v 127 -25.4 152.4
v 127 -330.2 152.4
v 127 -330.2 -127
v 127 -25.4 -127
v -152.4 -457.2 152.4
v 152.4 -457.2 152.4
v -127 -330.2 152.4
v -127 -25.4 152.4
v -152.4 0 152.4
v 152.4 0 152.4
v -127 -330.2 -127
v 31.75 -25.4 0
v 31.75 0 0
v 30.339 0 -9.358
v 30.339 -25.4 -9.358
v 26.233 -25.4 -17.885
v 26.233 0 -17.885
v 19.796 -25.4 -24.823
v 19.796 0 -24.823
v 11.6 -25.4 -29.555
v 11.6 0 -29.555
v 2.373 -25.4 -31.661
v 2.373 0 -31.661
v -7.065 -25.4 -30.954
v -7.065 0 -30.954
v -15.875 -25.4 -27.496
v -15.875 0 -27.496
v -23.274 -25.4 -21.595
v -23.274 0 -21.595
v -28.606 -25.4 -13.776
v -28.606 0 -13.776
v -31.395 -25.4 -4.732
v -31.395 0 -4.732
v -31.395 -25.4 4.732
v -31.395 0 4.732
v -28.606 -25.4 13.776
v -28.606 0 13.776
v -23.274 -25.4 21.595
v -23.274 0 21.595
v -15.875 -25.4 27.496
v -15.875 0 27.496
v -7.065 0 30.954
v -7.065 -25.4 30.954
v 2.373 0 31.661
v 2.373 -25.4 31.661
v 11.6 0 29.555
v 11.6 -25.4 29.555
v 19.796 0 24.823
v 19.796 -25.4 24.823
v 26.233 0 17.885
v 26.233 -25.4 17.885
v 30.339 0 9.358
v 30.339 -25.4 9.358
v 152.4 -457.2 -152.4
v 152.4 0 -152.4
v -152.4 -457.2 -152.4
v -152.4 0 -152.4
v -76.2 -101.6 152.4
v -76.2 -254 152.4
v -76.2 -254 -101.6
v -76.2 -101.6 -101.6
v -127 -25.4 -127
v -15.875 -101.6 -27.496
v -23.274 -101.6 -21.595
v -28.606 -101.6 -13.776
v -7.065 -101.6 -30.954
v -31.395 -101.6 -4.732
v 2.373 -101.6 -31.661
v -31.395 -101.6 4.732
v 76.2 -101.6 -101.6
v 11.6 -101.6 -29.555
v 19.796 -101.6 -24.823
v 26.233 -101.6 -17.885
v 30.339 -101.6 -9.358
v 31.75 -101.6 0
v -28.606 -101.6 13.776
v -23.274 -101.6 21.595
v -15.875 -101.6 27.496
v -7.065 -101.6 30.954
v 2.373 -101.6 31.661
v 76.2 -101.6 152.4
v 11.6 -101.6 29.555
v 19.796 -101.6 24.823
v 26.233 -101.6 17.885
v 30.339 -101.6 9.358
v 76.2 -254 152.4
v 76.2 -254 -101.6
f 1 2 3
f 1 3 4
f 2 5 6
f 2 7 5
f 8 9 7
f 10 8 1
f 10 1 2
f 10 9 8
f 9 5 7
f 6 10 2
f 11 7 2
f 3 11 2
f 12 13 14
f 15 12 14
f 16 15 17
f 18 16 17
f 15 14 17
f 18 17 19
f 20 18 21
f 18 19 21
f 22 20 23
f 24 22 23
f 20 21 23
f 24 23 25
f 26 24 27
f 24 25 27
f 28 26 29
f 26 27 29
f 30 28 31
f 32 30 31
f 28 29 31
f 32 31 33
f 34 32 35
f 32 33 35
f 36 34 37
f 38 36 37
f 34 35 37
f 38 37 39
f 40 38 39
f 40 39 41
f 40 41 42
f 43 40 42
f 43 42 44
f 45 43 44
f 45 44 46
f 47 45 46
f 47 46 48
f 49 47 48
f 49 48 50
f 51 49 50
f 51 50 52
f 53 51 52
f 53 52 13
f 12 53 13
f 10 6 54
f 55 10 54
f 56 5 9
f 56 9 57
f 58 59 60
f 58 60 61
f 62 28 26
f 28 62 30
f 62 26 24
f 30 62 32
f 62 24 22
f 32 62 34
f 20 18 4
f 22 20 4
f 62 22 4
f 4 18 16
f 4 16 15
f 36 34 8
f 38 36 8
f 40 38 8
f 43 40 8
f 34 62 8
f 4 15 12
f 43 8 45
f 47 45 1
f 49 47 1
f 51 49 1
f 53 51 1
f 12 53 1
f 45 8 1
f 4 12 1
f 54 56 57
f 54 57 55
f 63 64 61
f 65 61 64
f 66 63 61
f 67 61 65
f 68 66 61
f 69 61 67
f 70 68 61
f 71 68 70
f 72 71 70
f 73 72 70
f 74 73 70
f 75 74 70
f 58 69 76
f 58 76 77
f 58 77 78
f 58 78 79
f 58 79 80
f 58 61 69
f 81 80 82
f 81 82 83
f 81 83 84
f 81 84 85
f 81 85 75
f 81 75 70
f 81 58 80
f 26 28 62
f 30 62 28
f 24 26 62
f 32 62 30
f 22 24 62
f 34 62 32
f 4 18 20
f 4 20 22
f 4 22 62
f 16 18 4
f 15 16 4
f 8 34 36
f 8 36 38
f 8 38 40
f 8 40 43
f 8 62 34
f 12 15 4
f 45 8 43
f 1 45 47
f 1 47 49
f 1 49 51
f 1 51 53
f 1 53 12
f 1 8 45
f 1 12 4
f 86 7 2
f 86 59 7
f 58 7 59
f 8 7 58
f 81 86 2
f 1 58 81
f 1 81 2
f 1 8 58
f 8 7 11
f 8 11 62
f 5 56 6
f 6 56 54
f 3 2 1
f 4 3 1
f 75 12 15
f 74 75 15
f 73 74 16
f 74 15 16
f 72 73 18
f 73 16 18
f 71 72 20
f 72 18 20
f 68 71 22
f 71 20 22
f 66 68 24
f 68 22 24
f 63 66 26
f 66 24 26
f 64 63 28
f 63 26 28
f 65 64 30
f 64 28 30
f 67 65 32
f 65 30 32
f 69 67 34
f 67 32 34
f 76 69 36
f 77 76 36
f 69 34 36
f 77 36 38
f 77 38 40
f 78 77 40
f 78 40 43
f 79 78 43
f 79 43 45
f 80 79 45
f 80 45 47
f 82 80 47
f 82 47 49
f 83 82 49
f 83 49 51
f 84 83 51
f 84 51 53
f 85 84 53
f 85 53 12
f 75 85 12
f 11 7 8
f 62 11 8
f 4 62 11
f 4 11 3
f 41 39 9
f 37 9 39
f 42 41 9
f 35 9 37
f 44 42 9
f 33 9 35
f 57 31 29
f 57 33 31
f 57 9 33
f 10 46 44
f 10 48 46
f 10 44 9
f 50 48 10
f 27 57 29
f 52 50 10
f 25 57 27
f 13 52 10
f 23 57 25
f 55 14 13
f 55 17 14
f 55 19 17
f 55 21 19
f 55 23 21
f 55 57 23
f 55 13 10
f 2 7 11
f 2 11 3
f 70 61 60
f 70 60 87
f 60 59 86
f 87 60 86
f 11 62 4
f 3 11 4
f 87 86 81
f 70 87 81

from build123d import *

# Parameters (mm, degrees)
SKETCH1_W      = 304.8
SKETCH1_H      = 304.8
EXTRUDE1_DEPTH = 457.2
SKETCH2_W      = 254
SKETCH2_H      = 304.8
EXTRUDE2_DEPTH = 279.4
EXTRUDE3_REACH = 306.8
SKETCH3_W      = 254
SKETCH3_H      = 304.8
SKETCH4_W      = 152.4
SKETCH4_H      = 152.4
EXTRUDE4_DEPTH = 254
SKETCH5_R      = 31.75
EXTRUDE5_DEPTH = 254


with BuildPart() as part:
    # Sketch1 → Extrude1 (new body)
    with BuildSketch(Plane(origin=(0, 0, 0), x_dir=(1, 0, 0), z_dir=(0, 1, 0))):
        Rectangle(SKETCH1_W, SKETCH1_H)
    extrude(amount=-EXTRUDE1_DEPTH)

    # Sketch2 → Extrude2 (cut)
    with BuildSketch(Plane.XY.offset(152.4)):
        with Locations((0, -177.8)):
            Rectangle(SKETCH2_W, SKETCH2_H)
    extrude(amount=-EXTRUDE2_DEPTH, mode=Mode.SUBTRACT)


with BuildPart() as body_2:

    # Sketch3 → Extrude3 (new body, up to next)
    with BuildSketch(Plane.XY.offset(152.4), mode=Mode.PRIVATE) as extrude3_sk1:
        with Locations((0, -177.8)):
            Rectangle(SKETCH3_W, SKETCH3_H)
    extrude3_tool1 = extrude(extrude3_sk1.sketch, amount=-EXTRUDE3_REACH, mode=Mode.PRIVATE) - part.part
    add(extrude3_tool1.solids().sort_by_distance((0, -177.8, 152.4))[0])

    # Sketch4 → Extrude4 (cut)
    with BuildSketch(Plane.XY.offset(152.4)):
        with Locations((0, -177.8)):
            Rectangle(SKETCH4_W, SKETCH4_H)
    extrude(amount=-EXTRUDE4_DEPTH, mode=Mode.SUBTRACT)


with BuildPart() as extrude5_tool:
    # Sketch5 → Extrude5 (new body)
    with BuildSketch(Plane(origin=(0, 0, 0), x_dir=(1, 0, 0), z_dir=(0, 1, 0))):
        Circle(SKETCH5_R)
    extrude(amount=-EXTRUDE5_DEPTH)


with BuildPart() as part_1:
    add(part.part)

    # Extrude5: cut by extrude5_tool
    add(extrude5_tool.part, mode=Mode.SUBTRACT)


with BuildPart() as body_2_1:
    add(body_2.part)

    # Extrude5: cut by extrude5_tool
    add(extrude5_tool.part, mode=Mode.SUBTRACT)


solid = Compound([part_1.part, body_2_1.part])
